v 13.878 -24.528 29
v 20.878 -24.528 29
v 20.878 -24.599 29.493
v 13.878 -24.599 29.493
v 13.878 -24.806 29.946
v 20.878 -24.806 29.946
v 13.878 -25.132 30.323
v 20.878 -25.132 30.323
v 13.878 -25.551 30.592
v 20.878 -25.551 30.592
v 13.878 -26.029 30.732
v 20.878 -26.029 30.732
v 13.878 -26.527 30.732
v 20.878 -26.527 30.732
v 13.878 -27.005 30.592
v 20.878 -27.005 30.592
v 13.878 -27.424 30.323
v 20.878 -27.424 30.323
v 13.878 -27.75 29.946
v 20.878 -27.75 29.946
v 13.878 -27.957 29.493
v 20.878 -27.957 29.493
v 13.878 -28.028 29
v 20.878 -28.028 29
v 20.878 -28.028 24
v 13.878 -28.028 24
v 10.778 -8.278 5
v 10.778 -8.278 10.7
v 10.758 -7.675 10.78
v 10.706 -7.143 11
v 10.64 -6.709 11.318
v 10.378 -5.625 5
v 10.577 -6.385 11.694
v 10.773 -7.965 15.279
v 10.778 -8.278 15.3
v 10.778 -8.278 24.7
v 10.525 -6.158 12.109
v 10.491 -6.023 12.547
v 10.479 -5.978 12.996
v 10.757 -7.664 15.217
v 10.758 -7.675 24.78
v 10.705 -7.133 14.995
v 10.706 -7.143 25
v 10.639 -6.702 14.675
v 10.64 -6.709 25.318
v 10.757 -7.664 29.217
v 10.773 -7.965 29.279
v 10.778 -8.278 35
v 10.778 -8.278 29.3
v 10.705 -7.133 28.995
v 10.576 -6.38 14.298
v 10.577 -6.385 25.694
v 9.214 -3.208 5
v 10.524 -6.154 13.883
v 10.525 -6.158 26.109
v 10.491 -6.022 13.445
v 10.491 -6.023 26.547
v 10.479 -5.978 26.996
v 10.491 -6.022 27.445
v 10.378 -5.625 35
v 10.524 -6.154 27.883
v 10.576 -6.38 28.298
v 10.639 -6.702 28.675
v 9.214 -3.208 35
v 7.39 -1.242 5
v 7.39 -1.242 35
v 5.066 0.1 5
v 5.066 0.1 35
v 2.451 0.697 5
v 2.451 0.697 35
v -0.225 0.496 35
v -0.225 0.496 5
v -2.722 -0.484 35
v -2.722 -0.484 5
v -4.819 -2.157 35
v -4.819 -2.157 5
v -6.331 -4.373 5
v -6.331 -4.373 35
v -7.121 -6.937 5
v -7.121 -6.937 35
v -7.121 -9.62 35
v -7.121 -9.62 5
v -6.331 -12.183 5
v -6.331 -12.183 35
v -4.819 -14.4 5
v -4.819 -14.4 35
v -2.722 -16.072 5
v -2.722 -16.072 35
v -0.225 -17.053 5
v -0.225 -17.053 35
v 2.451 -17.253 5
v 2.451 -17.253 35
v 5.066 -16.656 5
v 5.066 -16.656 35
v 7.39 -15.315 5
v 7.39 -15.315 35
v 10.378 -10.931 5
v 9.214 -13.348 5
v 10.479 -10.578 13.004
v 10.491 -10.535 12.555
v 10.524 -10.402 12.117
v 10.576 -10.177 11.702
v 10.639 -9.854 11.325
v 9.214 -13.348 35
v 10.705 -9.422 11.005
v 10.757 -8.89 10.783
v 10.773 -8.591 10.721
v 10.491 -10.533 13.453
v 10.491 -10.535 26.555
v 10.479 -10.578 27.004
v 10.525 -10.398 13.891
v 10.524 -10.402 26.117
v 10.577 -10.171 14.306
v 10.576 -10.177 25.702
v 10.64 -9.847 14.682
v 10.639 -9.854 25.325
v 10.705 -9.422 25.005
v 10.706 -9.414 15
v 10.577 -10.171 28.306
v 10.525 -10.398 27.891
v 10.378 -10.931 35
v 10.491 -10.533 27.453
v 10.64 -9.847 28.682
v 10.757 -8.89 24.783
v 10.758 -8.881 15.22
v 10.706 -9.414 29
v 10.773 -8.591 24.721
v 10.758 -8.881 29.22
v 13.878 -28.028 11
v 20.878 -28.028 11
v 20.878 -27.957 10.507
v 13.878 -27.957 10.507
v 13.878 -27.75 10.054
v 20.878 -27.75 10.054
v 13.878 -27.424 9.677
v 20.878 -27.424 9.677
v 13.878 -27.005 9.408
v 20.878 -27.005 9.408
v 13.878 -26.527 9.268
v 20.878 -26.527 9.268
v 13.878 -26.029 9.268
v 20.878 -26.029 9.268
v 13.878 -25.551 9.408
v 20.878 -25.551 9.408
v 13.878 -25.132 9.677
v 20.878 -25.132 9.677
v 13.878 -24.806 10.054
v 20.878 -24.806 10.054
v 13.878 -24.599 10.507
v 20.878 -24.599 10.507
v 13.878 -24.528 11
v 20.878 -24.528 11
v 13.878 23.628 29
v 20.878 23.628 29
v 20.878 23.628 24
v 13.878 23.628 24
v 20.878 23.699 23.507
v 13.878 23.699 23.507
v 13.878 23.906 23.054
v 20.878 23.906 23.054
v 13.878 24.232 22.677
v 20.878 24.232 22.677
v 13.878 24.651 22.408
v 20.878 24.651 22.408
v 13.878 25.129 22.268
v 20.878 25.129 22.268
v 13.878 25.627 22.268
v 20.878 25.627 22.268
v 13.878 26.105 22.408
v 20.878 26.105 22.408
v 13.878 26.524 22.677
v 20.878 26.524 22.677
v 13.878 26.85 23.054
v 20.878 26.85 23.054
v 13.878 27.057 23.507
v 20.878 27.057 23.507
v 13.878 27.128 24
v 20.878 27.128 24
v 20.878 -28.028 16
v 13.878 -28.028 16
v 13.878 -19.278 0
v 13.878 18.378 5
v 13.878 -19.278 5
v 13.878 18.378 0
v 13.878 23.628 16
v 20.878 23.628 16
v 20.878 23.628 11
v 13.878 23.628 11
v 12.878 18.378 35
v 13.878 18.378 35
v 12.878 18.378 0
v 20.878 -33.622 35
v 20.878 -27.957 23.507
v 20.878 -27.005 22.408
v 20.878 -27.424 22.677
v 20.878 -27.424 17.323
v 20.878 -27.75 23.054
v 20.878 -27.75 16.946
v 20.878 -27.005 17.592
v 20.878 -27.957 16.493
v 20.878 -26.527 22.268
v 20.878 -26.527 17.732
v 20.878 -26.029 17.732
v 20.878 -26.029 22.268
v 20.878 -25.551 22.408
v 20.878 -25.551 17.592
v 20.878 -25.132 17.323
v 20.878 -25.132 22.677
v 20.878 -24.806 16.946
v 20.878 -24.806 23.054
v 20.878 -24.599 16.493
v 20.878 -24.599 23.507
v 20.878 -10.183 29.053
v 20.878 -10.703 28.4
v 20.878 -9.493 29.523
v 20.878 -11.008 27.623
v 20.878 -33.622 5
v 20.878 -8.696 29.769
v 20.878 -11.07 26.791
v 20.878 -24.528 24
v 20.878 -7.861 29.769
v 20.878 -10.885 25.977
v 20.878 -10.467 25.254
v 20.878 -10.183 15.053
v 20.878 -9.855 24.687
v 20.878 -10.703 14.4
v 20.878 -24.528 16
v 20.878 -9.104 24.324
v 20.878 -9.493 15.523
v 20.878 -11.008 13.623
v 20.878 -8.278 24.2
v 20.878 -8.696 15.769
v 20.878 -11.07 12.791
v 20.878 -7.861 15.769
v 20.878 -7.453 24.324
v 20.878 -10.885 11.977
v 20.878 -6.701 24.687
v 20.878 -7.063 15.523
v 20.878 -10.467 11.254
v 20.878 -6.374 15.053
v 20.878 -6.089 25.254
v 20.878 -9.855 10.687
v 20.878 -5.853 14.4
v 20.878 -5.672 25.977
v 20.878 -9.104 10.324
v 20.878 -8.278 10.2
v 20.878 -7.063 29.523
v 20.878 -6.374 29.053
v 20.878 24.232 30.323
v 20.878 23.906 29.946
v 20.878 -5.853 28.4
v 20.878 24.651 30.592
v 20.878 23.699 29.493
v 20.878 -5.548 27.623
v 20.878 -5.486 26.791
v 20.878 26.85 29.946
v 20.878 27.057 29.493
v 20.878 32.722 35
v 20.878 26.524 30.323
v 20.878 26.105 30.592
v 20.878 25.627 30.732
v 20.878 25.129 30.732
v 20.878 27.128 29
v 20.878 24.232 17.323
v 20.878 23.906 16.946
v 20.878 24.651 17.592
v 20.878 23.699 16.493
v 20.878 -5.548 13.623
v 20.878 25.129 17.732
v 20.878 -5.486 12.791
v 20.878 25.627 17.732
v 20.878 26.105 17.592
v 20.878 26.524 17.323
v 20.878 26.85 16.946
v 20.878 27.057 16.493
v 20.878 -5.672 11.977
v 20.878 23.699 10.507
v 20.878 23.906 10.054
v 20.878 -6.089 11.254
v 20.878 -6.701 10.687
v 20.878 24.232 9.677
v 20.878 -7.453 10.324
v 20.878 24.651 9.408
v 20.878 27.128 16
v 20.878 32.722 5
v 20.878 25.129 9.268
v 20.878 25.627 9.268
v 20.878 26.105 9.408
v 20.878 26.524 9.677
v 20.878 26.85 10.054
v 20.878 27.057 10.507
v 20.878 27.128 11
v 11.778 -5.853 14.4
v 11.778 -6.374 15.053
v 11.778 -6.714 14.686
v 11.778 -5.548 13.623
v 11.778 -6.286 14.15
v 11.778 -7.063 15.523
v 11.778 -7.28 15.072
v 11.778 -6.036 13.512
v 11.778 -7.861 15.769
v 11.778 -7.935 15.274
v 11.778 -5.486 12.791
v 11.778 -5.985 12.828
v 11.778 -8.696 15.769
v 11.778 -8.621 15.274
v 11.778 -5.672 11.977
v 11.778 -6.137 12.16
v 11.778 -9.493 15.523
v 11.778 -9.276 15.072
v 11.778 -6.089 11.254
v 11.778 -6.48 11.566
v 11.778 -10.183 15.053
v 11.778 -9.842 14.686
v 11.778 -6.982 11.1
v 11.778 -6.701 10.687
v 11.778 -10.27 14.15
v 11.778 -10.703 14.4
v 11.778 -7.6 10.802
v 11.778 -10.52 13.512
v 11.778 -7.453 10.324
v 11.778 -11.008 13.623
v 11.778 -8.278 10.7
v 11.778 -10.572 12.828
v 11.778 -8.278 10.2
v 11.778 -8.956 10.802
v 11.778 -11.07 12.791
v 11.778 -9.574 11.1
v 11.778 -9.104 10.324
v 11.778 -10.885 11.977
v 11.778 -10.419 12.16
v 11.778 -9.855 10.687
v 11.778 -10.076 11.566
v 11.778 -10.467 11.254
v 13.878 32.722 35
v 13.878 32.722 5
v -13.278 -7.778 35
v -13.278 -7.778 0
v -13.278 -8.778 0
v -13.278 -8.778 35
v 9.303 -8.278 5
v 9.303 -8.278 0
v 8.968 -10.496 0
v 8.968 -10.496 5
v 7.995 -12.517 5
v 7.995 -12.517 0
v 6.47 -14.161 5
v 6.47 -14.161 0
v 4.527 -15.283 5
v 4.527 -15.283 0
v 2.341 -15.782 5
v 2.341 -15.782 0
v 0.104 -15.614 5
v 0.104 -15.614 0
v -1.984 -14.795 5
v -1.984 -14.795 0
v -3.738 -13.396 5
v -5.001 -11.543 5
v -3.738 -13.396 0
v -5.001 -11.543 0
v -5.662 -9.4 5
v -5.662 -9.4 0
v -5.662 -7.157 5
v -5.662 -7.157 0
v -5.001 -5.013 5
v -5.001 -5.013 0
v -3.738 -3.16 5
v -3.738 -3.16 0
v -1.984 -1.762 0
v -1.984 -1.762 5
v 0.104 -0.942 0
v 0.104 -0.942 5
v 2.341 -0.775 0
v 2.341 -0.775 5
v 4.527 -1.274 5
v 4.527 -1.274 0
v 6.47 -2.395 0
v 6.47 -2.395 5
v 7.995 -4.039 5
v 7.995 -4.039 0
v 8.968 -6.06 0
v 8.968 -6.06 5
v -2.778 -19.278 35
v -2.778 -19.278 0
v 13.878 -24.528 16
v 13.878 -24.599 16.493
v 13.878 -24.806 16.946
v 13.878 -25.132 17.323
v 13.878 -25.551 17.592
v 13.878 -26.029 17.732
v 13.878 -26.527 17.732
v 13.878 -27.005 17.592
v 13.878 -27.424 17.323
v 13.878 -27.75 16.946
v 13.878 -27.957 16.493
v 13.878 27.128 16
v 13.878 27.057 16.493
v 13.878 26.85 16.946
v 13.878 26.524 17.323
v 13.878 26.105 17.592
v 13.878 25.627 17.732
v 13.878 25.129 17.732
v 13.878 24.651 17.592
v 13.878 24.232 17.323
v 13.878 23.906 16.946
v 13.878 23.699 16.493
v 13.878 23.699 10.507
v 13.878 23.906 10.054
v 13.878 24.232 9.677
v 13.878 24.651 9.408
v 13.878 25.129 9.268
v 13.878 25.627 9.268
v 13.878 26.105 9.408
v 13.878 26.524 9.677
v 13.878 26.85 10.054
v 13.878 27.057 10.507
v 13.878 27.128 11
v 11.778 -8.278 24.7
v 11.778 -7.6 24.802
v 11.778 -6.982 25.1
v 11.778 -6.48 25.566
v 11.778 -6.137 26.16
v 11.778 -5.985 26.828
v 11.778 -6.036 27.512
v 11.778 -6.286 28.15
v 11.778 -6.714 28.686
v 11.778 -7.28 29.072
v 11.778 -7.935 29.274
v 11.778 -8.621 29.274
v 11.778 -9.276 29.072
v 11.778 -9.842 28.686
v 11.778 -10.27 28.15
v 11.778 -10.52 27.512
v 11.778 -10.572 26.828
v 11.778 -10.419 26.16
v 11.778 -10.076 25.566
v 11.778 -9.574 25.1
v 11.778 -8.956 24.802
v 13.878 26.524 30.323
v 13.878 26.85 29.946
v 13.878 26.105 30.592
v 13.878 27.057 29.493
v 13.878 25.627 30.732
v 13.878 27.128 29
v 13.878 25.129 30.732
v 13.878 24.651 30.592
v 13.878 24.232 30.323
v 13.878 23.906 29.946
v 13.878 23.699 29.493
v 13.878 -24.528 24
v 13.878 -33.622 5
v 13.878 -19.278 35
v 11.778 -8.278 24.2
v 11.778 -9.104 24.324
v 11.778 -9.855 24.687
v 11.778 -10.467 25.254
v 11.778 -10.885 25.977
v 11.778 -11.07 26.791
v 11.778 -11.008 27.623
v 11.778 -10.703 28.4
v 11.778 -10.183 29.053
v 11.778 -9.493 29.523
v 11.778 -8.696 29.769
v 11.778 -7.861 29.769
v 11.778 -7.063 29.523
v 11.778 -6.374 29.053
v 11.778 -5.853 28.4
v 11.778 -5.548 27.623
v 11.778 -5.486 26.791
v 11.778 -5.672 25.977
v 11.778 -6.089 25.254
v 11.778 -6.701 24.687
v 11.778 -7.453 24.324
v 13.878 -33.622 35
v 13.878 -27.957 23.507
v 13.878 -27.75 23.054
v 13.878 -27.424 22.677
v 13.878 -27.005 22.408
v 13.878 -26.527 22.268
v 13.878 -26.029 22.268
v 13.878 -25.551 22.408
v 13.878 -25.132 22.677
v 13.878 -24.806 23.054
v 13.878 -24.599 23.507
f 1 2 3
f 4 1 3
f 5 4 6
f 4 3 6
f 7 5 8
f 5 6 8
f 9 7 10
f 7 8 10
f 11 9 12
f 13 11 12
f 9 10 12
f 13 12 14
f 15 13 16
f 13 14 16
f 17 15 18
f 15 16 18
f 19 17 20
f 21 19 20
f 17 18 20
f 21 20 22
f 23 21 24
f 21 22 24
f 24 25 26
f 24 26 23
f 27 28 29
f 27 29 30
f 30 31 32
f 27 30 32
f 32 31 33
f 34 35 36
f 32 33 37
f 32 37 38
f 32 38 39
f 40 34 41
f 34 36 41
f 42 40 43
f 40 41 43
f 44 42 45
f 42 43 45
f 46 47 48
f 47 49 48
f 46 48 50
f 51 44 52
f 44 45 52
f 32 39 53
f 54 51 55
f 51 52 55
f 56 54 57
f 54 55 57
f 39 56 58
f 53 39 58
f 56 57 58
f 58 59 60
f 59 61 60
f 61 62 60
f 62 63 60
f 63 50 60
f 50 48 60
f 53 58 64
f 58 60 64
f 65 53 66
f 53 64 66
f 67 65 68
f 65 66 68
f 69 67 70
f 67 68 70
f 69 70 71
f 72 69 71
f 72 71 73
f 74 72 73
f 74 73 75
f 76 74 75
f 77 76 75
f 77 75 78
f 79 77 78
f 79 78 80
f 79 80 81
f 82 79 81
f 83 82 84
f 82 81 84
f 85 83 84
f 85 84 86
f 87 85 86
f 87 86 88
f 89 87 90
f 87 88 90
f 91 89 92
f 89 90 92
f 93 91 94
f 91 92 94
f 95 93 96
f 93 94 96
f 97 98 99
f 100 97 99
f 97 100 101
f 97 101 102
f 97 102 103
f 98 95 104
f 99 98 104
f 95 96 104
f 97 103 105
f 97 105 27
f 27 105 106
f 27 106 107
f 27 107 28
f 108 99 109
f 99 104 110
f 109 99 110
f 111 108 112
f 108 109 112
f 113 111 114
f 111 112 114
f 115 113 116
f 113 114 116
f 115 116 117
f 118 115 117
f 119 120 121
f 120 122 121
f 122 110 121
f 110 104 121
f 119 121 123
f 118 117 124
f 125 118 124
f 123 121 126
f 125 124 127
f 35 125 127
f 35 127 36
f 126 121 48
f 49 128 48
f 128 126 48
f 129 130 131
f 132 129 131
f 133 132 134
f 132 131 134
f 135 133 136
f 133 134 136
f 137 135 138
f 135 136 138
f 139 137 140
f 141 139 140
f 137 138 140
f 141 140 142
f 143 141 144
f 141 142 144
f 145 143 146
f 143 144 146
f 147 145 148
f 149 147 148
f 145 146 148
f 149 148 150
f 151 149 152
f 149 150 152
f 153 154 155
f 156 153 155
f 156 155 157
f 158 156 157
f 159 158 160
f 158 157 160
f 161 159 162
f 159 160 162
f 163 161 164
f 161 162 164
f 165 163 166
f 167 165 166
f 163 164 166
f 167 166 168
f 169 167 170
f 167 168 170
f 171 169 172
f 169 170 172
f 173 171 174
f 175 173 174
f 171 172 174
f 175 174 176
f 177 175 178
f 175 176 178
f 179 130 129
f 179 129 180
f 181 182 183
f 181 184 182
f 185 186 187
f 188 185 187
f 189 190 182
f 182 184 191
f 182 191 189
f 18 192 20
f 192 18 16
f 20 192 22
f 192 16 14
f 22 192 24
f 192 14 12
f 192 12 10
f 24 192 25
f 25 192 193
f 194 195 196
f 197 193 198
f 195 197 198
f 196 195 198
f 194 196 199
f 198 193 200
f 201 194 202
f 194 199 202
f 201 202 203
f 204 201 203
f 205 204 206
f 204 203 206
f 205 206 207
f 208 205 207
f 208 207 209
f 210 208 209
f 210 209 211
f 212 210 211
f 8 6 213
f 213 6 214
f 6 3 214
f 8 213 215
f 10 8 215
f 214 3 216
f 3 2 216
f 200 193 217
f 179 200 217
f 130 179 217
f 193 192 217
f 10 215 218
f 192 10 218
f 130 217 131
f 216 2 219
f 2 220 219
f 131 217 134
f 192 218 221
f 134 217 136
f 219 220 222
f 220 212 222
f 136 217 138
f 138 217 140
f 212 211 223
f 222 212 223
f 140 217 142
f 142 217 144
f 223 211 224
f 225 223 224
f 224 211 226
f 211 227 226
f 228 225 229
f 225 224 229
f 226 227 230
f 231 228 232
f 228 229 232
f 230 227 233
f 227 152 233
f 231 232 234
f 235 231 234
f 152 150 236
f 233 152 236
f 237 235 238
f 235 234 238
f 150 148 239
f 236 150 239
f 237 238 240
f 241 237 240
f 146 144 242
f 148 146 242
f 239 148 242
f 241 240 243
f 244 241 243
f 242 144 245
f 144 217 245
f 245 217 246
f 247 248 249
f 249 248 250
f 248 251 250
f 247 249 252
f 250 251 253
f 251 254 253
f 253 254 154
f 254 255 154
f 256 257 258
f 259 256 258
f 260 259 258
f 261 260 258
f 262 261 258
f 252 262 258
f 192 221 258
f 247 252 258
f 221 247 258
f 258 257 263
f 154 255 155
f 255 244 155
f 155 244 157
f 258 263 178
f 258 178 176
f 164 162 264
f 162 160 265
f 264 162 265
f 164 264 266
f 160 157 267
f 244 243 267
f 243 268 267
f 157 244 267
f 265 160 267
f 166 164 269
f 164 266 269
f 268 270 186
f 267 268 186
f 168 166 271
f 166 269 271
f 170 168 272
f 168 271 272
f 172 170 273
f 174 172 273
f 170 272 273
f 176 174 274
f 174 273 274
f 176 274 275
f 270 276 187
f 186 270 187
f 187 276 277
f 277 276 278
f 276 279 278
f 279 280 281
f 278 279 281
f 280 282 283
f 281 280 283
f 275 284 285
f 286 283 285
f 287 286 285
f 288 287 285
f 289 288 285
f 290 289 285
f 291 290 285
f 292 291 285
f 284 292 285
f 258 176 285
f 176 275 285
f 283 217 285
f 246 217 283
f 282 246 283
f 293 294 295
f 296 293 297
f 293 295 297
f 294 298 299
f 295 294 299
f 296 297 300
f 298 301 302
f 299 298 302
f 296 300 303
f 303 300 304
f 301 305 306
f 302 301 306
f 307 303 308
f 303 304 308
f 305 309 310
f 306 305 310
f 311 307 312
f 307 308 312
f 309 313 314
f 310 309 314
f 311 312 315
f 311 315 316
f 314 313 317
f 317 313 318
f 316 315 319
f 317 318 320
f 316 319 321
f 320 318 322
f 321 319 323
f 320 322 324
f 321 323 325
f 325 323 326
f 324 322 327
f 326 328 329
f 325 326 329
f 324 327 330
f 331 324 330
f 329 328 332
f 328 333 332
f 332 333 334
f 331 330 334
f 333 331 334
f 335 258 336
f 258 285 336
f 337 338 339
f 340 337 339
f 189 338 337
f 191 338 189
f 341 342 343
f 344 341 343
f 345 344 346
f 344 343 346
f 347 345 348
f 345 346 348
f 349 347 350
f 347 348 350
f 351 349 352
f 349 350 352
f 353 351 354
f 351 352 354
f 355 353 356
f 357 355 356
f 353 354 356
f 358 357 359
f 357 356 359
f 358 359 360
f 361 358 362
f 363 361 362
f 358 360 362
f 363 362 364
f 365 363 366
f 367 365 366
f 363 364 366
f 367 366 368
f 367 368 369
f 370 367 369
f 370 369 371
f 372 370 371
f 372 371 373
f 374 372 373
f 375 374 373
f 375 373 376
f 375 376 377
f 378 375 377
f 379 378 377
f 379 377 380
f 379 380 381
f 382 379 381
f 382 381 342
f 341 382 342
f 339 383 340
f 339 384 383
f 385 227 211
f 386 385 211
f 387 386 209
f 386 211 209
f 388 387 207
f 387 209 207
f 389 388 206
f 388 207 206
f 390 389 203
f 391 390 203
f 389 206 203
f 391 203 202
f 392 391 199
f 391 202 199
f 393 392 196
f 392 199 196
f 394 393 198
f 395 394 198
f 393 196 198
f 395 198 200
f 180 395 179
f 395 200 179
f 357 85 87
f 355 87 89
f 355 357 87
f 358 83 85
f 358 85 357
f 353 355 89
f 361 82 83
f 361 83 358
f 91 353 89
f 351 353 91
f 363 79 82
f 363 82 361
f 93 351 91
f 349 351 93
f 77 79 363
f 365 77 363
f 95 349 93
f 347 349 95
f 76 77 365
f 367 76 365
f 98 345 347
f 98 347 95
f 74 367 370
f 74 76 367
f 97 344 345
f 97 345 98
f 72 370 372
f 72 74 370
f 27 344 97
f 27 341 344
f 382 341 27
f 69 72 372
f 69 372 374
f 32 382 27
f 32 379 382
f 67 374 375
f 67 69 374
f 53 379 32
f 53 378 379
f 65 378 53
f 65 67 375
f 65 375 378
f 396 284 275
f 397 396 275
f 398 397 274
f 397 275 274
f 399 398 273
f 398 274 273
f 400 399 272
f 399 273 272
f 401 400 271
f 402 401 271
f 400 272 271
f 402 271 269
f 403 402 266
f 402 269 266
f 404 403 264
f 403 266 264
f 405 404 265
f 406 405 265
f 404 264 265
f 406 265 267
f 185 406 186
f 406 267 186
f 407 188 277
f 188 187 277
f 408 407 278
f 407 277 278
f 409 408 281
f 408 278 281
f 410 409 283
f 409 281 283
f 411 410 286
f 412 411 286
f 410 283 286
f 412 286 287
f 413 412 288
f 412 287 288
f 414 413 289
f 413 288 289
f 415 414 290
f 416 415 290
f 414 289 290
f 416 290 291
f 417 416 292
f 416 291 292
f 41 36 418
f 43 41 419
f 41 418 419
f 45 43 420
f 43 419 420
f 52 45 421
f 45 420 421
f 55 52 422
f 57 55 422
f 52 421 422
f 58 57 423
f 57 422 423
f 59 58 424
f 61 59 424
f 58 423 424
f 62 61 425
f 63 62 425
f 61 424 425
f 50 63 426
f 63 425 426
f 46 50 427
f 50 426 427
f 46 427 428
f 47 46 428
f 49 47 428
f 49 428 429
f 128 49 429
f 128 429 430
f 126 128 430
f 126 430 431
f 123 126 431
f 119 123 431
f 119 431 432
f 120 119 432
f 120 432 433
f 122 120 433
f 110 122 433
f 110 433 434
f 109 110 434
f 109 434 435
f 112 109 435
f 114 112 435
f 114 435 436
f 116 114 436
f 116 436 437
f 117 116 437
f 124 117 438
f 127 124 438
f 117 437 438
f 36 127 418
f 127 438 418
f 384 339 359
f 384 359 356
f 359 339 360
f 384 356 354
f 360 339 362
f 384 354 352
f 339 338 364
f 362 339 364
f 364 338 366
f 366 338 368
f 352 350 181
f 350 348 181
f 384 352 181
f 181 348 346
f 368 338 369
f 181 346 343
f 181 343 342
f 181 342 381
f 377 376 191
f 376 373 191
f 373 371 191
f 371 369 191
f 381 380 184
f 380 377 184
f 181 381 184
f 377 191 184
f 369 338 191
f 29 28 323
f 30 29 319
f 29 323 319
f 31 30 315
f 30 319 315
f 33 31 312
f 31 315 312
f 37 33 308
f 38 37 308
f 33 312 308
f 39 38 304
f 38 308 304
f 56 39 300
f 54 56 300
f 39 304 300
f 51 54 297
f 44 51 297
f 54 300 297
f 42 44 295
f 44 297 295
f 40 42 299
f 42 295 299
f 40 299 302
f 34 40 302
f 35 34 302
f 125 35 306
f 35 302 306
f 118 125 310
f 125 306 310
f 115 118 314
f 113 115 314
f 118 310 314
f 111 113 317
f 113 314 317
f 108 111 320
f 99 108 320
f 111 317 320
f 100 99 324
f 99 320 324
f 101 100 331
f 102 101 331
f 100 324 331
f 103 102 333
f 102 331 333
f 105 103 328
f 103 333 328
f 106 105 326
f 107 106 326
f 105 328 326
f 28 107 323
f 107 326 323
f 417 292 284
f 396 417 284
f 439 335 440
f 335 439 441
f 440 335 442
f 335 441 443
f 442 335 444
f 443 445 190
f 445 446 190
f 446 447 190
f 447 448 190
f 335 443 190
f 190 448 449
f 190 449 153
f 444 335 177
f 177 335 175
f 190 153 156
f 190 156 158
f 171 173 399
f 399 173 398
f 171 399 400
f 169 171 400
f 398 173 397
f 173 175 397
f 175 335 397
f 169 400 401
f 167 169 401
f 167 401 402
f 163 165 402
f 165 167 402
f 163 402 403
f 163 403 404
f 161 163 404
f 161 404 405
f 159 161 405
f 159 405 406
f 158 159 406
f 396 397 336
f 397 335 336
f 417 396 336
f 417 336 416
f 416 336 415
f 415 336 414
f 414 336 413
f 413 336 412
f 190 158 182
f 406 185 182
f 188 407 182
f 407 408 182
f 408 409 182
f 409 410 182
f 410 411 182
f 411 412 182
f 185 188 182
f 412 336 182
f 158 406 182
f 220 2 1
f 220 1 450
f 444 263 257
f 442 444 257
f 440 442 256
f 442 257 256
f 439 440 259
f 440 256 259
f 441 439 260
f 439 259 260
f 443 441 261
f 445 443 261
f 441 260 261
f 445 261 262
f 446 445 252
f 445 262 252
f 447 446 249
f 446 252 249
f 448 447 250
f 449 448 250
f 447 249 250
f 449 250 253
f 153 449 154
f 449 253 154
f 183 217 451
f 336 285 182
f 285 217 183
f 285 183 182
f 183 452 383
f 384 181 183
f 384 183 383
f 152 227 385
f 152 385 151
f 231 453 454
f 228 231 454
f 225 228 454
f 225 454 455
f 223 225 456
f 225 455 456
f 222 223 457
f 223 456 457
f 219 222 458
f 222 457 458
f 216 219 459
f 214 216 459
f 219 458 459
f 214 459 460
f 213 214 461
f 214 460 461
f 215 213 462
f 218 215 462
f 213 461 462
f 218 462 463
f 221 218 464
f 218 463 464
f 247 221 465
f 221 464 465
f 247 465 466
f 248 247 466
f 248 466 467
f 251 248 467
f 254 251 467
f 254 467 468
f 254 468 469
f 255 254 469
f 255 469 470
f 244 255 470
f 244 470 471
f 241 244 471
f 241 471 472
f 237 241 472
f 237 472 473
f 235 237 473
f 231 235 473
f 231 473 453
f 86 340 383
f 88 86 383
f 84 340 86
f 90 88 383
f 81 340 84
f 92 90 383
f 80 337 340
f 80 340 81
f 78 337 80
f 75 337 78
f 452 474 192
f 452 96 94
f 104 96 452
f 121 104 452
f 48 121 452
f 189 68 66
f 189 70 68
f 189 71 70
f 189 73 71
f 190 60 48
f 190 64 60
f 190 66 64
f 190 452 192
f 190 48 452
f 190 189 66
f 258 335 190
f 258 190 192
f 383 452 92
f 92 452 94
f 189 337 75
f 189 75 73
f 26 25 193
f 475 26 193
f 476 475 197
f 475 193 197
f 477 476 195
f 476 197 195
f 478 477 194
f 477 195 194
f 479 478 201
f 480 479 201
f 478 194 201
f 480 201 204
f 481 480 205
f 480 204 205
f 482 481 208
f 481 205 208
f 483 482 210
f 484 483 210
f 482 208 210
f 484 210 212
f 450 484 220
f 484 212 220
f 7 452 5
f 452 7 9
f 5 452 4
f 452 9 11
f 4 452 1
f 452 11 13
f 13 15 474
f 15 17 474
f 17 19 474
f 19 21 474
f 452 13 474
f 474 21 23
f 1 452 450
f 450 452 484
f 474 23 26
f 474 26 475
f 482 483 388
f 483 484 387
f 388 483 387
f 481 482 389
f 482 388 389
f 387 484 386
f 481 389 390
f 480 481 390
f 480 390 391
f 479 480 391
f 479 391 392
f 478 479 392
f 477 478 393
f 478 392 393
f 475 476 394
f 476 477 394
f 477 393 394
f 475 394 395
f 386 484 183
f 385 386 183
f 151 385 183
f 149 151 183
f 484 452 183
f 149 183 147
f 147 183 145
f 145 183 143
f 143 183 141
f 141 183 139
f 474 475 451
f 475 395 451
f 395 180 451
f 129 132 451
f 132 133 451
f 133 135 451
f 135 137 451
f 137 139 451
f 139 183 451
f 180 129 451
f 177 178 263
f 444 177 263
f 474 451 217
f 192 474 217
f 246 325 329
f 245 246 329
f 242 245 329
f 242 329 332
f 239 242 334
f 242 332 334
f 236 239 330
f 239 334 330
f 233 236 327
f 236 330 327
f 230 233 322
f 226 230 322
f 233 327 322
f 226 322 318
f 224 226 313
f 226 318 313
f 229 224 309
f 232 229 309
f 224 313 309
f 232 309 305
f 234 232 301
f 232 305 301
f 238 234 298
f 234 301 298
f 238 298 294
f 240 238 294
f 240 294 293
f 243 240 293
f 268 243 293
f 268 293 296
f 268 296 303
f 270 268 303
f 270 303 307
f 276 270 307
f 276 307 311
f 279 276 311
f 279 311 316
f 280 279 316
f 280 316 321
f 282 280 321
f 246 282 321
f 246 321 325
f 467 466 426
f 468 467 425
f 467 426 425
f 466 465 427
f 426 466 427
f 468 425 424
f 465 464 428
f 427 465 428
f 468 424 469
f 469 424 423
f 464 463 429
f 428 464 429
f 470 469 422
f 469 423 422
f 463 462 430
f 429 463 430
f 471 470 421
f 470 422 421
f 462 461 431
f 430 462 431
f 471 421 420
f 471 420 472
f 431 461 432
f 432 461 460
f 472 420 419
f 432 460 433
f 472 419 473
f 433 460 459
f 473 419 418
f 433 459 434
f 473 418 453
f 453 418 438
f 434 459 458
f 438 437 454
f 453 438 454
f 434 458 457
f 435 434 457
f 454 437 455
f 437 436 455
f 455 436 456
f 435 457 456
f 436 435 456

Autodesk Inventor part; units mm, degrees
ref_plane "Work Plane1" through (0, 0, 0) normal (0, 0, 1) x (1, 0, 0)
sketch "Sketch1" plane through (0, 0, 0) normal (0, 0, 1) x (1, 0, 0)
  circle A0 centre (1.7782, -8.2782) radius 7.5245 construction
  line L0 (-2.7782, -19.2782) -> (-13.7782, -8.2782) construction
  line L1 (13.7782, -19.2782) -> (-2.7782, -19.2782) construction
  line L2 (13.7782, 19.2782) -> (13.7782, -19.2782) construction
  line L3 (-13.7782, -8.2782) -> (13.7782, 19.2782) construction
  line L4 (13.8782, -19.2782) -> (-2.7782, -19.2782)
  line L5 (-2.7782, -19.2782) -> (-13.2782, -8.7782)
  circle A1 centre (1.7782, -8.2782) radius 7.5245
  line L6 (-13.2782, -7.7782) -> (12.8782, 18.3782)
  line L7 (-13.7782, -8.2782) -> (13.7782, 19.2782) construction
  line L8 (13.7782, 19.2782) -> (13.7782, 36.7218) construction
  line L9 (13.7782, 36.7218) -> (-18.2218, 36.7218) construction
  line L10 (-13.2782, -7.7782) -> (-13.2782, -8.7782)
  line L11 (20.8782, 32.7218) -> (13.8782, 32.7218)
  line L12 (13.8782, -33.6218) -> (20.8782, -33.6218)
  line L13 (20.8782, -33.6218) -> (20.8782, 32.7218)
  line L14 (13.8782, 18.3782) -> (12.8782, 18.3782)
  line L15 (13.8782, 32.7218) -> (13.8782, 18.3782)
  line L16 (13.8782, -19.2782) -> (13.8782, -33.6218)
  line L17 (13.7782, -19.2782) -> (-2.7782, -19.2782) projected
  line L18 (-2.7782, -19.2782) -> (-13.7782, -8.2782) projected
  line L19 (-18.2218, 36.7218) -> (-18.2218, -48.2782) projected
  line L20 (-18.2218, -48.2782) -> (13.7782, -48.2782) projected
  line L21 (13.7782, -48.2782) -> (13.7782, -19.2782) projected
  point P0 (0, 0)
  dimension "d0" = 0
  dimension "d4" = 0.1
  dimension "d5" = 1
  dimension "d6" = 1
  dimension "d7" = 0
  dimension "d8" = 0
  dimension "d9" = 0
  dimension "d10" = 7
  dimension "d11" = 4
  dimension "d13" = 66.3436
ref_plane "Work Plane2" through (-18.2218, -48.2782, 35.3062) normal (0, 0, 1) x (1, 0, 0)
extrude "Main Part Body" add sketch "Sketch1" along normal blind 35
ref_plane "Work Plane3" through (0, 0, 5) normal (0, 0, -1) x (-1, 0, 0)
sketch "Sketch2" plane through (-2.7782, -19.2782, 35) normal (0, 0, 1) x (1, 0, 0)
  circle A0 centre (4.5563, 11) radius 9
  circle A1 centre (4.5563, 11) radius 7.5245 construction
  dimension "d59" = 18
extrude "Bore for SM05" cut sketch "Sketch2" against normal up to surface (30 mm away)
sketch "Sketch3" plane through (20.8782, -33.6218, 35.3062) normal (1, 0, 0) x (0, 0, -1)
  circle A0 centre (22.3062, 25.3437) radius 2.3
  circle A1 centre (8.3062, 25.3437) radius 2.3
  line L0 (42.3062, 25.3437) -> (-6.6938, 25.3437) construction
  line L1 (30.3062, 79.6124) -> (30.3062, -13.2687) construction
  line L2 (35.3062, 0) -> (35.3062, 66.3437) construction
  line L3 (35.3062, 66.3437) -> (0.3062, 66.3437) construction
  line L4 (0.3062, 0) -> (0.3062, 66.3437) construction
  line L5 (35.3062, 0) -> (0.3062, 0) construction
  point P0 (35.3062, 33.6218)
  dimension "d21" = 4.6
  dimension "d22" = 4.6
  dimension "d27" = 8
  dimension "d52" = 8
extrude "Thru Holes for Lens Tube Set Screws M4" cut sketch "Sketch3" against normal up to next
sketch "Sketch4" plane through (20.8782, -33.6218, 0) normal (1, 0, 0) x (0, 0, -1)
  circle A0 centre (-13, 25.3437) radius 2.3 construction
  circle A1 centre (-27, 25.3437) radius 2.3 construction
  point P0 (0, 33.6218)
hole "Holes for Set Screw Insert M4" at (20.8782, -8.2782, 13) at (20.8782, -8.2782, 27) direction (-1, 0, 0) diameter 5.6 depth 9.1
sketch "Sketch6" plane through (0, 0, 0) normal (0, 0, -1) x (-1, 0, 0)
  line L0 (-20.8782, -33.6218) -> (-20.8782, 32.7218) construction
  line L1 (-13.8782, -33.6218) -> (-20.8782, -33.6218) construction
  line L2 (-13.8782, -19.2782) -> (-13.8782, -33.6218) construction
  line L3 (2.7782, -19.2782) -> (-13.8782, -19.2782) construction
  line L4 (13.2782, -8.7782) -> (2.7782, -19.2782) construction
  line L5 (13.2782, -7.7782) -> (13.2782, -8.7782) construction
  line L6 (-12.8782, 18.3782) -> (13.2782, -7.7782) construction
  line L7 (-13.8782, 18.3782) -> (-12.8782, 18.3782) construction
  line L8 (-13.8782, 32.7218) -> (-13.8782, 18.3782) construction
  line L9 (-20.8782, 32.7218) -> (-13.8782, 32.7218) construction
  circle A0 centre (-1.7782, -8.2782) radius 7.5245 construction
  line L10 (-20.8782, 32.7218) -> (-13.8782, 32.7218)
  line L11 (-13.8782, 32.7218) -> (-13.8782, -33.6218)
  line L12 (-13.8782, -33.6218) -> (-20.8782, -33.6218)
  line L13 (-20.8782, -33.6218) -> (-20.8782, 32.7218)
  point P0 (0, 0)
extrude "Extrusion5" cut sketch "Sketch6" against normal blind 5
sketch "Sketch5" plane through (20.8782, -33.6218, 0) normal (1, 0, 0) x (0, 0, -1)
  circle A0 centre (-27, 25.3437) radius 2.8 construction
  circle A1 centre (-13, 25.3437) radius 2.8 construction
  line L0 (-5, 0) -> (-35, 0) construction
  line L1 (-5, 66.3437) -> (-35, 66.3437) construction
  line L2 (0, 52) -> (-5, 52) construction
  line L3 (0, 14.3437) -> (-5, 14.3437) construction
  line L4 (0, 33.1718) -> (-35, 33.1718) construction
  line L5 (-35.6124, 59) -> (-5, 59) construction
  line L6 (-11, 59) -> (-16, 59) construction
  line L7 (-11, 60.75) -> (-16, 60.75)
  line L8 (-16, 57.25) -> (-11, 57.25)
  arc A2 (-11, 57.25) -> (-11, 60.75) centre (-11, 59) ccw
  arc A3 (-16, 60.75) -> (-16, 57.25) centre (-16, 59) ccw
  line L9 (-24, 59) -> (-29, 59) construction
  line L10 (-24, 60.75) -> (-29, 60.75)
  line L11 (-29, 57.25) -> (-24, 57.25)
  arc A4 (-24, 57.25) -> (-24, 60.75) centre (-24, 59) ccw
  arc A5 (-29, 60.75) -> (-29, 57.25) centre (-29, 59) ccw
  line L12 (-11, 5.5937) -> (-16, 5.5937)
  line L13 (-16, 9.0937) -> (-11, 9.0937)
  arc A6 (-11, 5.5937) -> (-11, 9.0937) centre (-11, 7.3437) ccw
  arc A7 (-16, 9.0937) -> (-16, 5.5937) centre (-16, 7.3437) ccw
  line L14 (-24, 5.5937) -> (-29, 5.5937)
  line L15 (-29, 9.0937) -> (-24, 9.0937)
  arc A8 (-24, 5.5937) -> (-24, 9.0937) centre (-24, 7.3437) ccw
  arc A9 (-29, 9.0937) -> (-29, 5.5937) centre (-29, 7.3437) ccw
  line L16 (-5, 0) -> (-5, 66.3437) projected
  line L17 (-35, 0) -> (-35, 66.3437) projected
  point P0 (0, 33.6218)
  point P1 (-13.5, 59)
  point P2 (-26.5, 59)
  dimension "d37" = 7
  dimension "d40" = 5
  dimension "d41" = 5
  dimension "d42" = 3.5
  dimension "d43" = 3.5
  dimension "d51" = 8
  dimension "d54" = 6
  dimension "d55" = 6
extrude "Slots for Holddown Screws" cut sketch "Sketch5" against normal through all
equation "\"d22\" = d21"
equation "\"d52\" = d27"
equation "\"d41\" = d40"
equation "\"d43\" = d42"
properties part number "Cuvette Holder Adjustable Recv"
